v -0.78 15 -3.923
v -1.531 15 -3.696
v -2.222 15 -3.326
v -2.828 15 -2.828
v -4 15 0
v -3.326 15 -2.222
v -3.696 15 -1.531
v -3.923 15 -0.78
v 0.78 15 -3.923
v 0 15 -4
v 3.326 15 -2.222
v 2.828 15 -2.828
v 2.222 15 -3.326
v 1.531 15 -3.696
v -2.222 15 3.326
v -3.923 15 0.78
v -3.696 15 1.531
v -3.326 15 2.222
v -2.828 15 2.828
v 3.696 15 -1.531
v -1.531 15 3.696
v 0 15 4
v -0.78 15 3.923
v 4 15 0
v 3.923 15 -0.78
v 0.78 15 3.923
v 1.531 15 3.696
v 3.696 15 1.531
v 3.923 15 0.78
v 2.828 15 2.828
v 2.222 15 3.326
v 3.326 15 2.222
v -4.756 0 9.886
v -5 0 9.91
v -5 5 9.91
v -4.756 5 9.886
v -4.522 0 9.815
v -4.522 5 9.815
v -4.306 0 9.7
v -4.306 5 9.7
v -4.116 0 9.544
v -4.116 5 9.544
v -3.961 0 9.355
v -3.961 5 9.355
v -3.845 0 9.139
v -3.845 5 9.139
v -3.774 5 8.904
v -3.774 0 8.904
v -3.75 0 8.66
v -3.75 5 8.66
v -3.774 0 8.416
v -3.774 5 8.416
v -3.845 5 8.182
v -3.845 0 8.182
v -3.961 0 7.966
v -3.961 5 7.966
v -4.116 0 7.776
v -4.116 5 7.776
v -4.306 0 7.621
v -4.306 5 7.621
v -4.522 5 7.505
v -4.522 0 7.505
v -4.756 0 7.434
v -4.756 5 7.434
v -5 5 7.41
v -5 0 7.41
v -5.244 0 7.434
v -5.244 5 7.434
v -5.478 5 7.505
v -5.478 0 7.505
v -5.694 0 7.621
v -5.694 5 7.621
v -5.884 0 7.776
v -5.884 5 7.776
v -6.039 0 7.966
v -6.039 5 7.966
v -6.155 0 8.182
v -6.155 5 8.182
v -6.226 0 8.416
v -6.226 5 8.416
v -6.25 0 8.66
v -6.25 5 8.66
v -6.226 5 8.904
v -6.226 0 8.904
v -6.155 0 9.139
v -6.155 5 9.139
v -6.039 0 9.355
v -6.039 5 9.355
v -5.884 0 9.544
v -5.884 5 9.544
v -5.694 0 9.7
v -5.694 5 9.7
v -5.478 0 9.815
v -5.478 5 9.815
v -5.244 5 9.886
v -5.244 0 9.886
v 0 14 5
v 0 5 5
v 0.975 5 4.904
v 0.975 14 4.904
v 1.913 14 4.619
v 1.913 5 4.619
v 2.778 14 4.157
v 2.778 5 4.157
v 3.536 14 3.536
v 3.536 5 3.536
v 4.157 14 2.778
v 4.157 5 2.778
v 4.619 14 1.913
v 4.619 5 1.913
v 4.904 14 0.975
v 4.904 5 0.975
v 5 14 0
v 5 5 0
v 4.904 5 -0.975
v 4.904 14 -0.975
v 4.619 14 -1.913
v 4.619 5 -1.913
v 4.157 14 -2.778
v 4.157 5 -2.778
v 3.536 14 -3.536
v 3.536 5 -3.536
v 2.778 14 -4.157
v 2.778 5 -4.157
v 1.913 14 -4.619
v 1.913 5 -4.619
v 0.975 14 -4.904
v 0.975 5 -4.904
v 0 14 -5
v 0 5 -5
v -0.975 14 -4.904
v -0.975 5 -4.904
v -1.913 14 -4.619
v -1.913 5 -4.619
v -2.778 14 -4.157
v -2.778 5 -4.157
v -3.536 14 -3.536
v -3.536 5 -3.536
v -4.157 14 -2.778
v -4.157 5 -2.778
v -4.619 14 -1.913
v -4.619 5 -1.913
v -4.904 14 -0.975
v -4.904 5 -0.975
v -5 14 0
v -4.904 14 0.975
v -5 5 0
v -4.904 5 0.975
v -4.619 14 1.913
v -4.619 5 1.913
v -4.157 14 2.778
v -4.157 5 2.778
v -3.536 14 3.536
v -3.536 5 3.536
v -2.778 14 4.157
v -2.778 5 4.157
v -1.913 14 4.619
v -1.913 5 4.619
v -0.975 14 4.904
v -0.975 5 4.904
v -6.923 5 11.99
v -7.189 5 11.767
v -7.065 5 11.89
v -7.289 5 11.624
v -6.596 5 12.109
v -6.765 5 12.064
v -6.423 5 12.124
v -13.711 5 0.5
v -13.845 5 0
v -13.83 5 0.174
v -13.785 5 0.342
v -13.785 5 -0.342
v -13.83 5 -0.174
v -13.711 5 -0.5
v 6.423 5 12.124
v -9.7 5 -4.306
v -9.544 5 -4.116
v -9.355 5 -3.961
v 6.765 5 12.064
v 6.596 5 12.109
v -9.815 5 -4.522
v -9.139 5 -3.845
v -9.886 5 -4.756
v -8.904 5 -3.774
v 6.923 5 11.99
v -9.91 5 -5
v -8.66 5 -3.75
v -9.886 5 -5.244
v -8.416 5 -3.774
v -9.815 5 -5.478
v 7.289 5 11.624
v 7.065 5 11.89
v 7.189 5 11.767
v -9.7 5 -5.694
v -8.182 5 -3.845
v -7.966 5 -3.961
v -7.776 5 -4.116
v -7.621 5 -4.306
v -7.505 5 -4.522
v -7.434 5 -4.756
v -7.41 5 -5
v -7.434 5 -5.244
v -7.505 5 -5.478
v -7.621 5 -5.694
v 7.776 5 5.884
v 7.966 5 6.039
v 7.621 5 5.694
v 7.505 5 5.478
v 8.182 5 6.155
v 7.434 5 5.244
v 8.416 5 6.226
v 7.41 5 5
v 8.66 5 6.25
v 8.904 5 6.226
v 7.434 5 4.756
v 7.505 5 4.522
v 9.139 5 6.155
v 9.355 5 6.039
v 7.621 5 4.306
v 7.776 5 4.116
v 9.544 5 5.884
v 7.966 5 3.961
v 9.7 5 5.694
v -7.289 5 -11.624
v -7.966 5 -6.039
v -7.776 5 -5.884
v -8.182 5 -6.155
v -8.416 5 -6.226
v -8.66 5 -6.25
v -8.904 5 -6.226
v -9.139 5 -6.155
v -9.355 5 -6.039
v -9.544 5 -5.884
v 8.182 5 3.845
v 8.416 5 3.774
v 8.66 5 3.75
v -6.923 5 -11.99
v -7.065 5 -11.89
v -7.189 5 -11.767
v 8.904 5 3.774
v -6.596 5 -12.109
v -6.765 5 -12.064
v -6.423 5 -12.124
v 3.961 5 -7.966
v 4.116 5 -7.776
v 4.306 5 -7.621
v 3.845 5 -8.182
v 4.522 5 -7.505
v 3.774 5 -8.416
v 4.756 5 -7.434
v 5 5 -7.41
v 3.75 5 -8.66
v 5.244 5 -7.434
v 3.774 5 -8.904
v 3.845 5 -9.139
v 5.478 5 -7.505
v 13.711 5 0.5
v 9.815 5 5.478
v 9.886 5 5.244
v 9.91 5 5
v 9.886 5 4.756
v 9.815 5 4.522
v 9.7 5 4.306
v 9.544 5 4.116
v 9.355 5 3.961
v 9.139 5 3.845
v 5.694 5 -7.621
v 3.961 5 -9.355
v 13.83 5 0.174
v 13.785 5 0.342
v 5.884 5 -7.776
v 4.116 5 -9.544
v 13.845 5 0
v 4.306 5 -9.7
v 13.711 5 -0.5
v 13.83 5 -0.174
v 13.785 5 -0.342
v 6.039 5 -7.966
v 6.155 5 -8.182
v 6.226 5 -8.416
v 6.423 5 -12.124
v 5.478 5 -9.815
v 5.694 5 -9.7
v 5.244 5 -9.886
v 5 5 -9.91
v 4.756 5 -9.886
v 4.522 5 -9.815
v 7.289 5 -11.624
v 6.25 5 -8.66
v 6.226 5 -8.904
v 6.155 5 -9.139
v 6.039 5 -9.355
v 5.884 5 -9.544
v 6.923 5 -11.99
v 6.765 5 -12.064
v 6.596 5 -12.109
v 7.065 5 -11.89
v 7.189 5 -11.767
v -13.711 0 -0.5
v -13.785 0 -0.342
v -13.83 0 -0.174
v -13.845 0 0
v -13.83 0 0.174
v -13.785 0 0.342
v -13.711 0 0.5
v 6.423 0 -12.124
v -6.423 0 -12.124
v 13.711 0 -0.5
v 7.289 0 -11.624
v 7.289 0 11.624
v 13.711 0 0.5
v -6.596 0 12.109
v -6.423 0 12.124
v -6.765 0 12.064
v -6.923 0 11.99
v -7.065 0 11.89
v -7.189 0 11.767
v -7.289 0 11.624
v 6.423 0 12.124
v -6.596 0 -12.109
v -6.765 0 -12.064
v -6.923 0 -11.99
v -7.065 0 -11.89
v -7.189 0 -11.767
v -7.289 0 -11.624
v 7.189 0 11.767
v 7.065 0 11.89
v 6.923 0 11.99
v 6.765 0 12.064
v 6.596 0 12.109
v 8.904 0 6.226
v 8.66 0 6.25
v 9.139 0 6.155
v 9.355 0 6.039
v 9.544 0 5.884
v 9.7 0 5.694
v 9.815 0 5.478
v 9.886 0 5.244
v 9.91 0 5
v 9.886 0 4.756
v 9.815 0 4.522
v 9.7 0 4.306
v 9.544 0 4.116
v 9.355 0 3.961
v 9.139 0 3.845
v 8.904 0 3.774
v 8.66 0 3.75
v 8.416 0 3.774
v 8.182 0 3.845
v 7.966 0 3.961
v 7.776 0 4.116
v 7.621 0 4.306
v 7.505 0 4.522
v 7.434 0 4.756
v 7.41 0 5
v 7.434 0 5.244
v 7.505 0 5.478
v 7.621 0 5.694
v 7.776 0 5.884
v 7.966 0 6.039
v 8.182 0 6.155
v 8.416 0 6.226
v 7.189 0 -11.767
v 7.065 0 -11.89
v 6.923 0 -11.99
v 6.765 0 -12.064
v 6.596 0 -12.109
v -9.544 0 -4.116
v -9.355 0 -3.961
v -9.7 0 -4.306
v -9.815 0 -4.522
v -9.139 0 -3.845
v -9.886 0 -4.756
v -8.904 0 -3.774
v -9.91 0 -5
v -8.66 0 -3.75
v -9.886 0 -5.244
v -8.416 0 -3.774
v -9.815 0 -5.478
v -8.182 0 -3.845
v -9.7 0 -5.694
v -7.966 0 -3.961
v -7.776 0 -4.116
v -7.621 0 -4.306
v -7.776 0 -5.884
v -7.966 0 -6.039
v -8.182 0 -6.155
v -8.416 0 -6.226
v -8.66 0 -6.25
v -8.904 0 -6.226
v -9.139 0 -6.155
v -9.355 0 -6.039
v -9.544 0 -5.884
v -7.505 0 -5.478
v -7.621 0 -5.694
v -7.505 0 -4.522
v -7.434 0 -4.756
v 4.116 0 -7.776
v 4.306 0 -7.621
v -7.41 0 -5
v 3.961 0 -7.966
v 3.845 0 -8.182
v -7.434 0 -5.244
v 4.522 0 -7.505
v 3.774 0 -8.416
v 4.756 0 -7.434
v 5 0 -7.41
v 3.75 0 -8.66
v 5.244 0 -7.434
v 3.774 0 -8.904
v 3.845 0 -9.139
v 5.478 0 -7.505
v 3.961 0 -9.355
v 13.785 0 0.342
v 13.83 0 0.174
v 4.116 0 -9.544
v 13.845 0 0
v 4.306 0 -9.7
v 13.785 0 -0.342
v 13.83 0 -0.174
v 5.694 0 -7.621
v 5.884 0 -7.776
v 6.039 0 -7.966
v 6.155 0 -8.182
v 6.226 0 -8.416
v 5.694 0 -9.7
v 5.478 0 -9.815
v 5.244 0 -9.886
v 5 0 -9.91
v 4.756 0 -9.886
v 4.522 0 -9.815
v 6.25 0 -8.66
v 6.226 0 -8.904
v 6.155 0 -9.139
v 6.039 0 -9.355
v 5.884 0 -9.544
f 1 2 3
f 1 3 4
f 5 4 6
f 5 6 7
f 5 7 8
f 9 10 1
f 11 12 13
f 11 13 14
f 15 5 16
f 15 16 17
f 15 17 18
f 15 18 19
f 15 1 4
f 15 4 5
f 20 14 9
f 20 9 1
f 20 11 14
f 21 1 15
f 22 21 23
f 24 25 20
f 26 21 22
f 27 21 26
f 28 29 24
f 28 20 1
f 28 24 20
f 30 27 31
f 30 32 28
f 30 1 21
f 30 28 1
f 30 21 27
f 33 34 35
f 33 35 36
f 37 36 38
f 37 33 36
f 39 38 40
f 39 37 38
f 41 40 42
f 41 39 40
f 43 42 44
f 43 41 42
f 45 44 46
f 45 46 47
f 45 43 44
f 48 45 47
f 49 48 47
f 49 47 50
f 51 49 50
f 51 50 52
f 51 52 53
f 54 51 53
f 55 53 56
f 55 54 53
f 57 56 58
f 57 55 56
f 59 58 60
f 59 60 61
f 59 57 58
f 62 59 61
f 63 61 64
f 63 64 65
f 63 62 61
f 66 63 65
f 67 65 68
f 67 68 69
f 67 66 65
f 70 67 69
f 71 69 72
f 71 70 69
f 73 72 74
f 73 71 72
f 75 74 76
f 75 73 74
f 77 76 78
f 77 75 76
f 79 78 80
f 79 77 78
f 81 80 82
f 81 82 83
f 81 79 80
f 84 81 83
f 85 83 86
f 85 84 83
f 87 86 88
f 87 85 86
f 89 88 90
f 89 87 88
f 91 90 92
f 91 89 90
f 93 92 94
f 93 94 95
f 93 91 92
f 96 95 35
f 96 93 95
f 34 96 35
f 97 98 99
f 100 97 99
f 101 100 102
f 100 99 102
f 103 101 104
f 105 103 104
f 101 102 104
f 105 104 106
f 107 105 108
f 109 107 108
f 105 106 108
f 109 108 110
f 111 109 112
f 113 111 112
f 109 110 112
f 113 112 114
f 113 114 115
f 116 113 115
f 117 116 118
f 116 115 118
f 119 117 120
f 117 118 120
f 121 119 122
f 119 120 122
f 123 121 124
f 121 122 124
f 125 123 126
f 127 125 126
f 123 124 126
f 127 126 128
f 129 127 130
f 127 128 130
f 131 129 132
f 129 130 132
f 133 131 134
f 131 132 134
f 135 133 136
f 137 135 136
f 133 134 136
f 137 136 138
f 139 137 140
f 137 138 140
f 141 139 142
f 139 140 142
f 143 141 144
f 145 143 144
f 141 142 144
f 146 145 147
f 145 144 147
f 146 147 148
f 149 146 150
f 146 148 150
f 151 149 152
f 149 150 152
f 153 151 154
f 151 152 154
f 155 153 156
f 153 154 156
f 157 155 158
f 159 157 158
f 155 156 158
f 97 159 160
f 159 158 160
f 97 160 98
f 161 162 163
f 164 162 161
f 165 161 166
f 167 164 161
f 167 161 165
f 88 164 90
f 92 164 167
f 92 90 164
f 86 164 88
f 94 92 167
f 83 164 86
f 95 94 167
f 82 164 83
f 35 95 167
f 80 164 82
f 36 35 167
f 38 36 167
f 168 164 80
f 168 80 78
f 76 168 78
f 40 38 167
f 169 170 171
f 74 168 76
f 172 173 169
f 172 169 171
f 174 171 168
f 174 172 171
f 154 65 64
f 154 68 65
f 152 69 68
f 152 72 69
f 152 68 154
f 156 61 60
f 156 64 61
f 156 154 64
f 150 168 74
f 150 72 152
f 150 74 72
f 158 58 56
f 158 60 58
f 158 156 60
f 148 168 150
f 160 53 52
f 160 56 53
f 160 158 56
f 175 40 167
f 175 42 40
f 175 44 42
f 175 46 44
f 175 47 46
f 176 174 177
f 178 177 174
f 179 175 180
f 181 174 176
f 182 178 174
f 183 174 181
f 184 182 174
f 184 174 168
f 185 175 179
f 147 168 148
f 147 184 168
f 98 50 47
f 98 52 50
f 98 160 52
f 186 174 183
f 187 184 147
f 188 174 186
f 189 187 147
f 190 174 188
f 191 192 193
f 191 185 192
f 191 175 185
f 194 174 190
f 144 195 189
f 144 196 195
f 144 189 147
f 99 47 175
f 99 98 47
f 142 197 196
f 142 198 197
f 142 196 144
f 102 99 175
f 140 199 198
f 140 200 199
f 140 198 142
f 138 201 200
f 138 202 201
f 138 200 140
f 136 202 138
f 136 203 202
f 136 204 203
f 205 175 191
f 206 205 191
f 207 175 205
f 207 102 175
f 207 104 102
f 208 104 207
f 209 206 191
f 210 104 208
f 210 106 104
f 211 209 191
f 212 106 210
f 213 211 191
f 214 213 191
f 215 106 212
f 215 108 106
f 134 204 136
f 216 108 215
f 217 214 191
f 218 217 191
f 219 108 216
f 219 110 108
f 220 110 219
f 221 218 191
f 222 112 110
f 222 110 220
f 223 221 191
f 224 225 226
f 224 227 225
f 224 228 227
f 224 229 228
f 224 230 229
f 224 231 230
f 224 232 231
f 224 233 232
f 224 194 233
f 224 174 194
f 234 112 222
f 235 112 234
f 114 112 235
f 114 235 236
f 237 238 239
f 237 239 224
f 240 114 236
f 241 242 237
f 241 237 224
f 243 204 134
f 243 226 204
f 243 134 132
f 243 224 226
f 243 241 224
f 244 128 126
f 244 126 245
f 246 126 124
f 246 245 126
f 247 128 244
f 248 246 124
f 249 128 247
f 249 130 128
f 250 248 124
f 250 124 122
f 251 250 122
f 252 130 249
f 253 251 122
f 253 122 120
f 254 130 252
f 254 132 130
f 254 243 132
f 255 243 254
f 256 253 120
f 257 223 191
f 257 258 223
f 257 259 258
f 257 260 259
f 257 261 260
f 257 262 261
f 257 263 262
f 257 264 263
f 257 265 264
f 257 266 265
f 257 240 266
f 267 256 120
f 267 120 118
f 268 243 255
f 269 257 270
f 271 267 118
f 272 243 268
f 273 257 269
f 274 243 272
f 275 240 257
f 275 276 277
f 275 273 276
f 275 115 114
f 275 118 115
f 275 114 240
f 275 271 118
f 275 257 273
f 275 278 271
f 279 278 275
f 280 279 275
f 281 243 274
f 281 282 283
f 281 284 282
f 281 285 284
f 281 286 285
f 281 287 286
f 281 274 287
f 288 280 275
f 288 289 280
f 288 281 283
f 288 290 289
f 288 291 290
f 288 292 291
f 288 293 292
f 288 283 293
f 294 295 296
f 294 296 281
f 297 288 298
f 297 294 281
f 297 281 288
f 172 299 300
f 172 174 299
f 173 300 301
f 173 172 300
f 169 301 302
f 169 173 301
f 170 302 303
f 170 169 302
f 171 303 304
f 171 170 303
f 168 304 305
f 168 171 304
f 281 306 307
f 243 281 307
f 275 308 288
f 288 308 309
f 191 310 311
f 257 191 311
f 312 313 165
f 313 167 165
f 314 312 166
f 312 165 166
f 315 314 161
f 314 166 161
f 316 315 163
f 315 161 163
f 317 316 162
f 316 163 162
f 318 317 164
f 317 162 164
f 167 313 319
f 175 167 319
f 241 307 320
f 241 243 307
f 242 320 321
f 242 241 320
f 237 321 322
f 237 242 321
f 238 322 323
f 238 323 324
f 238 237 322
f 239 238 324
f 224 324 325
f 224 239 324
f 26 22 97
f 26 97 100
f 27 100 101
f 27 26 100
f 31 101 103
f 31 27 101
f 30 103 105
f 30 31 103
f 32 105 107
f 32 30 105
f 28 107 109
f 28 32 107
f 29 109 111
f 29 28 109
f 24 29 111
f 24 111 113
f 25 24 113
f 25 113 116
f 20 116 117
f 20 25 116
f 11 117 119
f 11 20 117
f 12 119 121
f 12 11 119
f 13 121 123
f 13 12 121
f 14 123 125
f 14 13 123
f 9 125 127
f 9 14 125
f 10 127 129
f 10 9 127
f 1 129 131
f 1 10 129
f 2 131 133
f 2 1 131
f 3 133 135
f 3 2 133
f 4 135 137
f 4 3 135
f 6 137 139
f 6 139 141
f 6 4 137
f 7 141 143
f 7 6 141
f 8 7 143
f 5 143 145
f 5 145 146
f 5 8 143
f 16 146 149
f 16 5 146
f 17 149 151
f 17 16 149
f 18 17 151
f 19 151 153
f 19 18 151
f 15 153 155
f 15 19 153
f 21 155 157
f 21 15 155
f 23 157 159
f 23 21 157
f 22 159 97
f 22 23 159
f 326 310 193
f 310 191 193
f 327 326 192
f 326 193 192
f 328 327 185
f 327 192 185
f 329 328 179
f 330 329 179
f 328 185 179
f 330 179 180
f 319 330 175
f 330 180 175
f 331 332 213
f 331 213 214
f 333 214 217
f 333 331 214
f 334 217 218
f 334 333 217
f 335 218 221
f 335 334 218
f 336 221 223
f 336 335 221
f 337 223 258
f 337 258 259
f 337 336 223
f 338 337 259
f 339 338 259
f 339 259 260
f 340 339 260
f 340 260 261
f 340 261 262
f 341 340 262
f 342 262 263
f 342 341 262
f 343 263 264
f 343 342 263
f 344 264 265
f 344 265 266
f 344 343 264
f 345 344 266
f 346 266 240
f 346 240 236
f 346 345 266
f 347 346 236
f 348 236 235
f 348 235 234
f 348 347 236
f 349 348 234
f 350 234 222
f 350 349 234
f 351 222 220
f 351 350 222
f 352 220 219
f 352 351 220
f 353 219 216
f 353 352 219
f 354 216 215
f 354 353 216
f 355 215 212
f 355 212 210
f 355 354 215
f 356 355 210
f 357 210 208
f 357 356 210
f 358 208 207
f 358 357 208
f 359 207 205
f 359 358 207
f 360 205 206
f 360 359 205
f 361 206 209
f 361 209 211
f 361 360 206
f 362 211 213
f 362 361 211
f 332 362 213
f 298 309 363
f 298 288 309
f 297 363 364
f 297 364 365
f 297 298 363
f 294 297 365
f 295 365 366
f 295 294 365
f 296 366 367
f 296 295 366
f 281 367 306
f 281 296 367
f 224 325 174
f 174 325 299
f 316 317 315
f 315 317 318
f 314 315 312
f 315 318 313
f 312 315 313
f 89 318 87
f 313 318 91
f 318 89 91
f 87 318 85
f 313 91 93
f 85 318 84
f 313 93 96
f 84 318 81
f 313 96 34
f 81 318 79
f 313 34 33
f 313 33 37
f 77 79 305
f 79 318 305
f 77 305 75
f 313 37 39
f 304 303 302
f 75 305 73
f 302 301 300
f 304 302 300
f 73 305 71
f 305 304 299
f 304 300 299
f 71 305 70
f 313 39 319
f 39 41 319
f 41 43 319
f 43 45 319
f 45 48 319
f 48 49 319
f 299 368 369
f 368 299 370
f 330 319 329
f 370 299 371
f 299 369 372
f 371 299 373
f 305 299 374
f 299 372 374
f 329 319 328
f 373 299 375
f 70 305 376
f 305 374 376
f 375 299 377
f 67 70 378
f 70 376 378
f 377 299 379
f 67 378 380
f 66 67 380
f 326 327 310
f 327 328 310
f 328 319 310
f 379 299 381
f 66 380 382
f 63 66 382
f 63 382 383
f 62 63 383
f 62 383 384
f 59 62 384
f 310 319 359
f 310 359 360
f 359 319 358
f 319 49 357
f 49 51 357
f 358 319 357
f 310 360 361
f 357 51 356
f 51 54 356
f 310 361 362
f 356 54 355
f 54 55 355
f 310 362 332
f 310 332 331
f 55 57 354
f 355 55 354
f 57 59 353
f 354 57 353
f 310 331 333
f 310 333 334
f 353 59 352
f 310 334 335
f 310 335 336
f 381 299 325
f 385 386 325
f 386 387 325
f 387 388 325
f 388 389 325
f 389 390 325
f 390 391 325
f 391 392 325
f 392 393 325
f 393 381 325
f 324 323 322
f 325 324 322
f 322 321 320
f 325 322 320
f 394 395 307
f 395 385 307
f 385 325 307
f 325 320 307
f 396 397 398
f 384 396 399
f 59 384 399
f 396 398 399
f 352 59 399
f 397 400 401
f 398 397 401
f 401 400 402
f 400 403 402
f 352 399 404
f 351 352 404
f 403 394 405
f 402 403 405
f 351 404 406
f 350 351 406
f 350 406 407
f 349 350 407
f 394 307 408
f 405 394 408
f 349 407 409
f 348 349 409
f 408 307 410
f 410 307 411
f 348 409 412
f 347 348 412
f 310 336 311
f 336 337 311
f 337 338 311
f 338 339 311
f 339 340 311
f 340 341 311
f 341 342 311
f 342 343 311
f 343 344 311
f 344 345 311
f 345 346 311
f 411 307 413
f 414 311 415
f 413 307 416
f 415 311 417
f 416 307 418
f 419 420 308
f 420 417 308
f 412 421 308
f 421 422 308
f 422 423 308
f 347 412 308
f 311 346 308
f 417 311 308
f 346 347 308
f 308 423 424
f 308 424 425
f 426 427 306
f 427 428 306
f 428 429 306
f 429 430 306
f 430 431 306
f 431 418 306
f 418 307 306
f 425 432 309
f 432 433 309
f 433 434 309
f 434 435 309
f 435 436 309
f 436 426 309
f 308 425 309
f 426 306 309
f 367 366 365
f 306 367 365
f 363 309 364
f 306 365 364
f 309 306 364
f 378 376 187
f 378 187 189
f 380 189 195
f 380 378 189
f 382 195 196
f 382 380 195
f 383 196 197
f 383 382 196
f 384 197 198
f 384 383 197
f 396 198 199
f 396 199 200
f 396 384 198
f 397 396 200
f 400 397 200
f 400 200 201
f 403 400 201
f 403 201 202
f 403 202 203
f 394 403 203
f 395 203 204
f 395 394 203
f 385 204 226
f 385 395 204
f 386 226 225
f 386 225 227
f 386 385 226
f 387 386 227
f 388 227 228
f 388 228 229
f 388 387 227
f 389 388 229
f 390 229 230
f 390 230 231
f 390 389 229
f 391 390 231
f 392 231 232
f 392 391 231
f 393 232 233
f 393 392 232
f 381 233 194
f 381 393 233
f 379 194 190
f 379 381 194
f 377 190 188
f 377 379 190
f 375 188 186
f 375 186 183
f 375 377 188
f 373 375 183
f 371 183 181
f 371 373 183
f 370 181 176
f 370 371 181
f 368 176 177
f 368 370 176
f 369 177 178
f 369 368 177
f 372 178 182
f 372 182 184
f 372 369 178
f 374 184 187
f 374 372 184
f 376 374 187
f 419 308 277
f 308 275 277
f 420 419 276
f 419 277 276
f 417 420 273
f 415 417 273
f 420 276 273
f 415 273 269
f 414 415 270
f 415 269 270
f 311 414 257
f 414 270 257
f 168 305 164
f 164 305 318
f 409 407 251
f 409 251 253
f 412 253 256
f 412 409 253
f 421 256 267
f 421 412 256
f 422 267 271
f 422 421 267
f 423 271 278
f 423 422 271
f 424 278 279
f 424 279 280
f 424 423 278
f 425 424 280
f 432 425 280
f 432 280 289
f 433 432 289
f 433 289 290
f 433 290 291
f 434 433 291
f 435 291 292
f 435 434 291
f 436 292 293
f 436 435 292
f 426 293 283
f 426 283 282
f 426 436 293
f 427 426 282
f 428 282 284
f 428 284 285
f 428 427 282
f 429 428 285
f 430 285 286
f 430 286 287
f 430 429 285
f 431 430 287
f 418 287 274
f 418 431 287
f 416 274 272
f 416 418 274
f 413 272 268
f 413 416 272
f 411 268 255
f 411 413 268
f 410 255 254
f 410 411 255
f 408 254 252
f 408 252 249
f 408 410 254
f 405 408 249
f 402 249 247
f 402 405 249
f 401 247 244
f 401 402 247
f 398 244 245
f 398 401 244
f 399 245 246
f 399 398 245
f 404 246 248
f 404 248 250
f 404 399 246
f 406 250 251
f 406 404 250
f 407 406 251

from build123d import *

# Parameters (mm, degrees)
SKETCH_1_R      = 1.25
EXTRUDE_1_DEPTH = 5
SKETCH_2_R      = 5
EXTRUDE_2_DEPTH = 10
FILLET_1_R      = 1
CHAMFER_1_SIZE  = 1


with BuildPart() as part:
    # Эскиз1 → Бобышка-Вытянуть1 (new body)
    with BuildSketch(Plane(origin=(0, 0, 0), x_dir=(1, 0, 0), z_dir=(0, 1, 0))):
        Polygon((14, 0), (7, 12.124355653), (-7, 12.124355653), (-14, 0), (-7, -12.124355653), (7, -12.124355653), align=None)
        with Locations(Location((5, 8.660254038, 0), (0, 0, 270))):
            Circle(SKETCH_1_R, mode=Mode.SUBTRACT)
        with Locations(Location((8.660254038, -5, 0), (0, 0, 270))):
            Circle(SKETCH_1_R, mode=Mode.SUBTRACT)
        with Locations(Location((-5, -8.660254038, 0), (0, 0, 270))):
            Circle(SKETCH_1_R, mode=Mode.SUBTRACT)
        with Locations(Location((-8.660254038, 5, 0), (0, 0, 270))):
            Circle(SKETCH_1_R, mode=Mode.SUBTRACT)
    extrude(amount=EXTRUDE_1_DEPTH)

    # Эскиз2 → Бобышка-Вытянуть2 (add)
    with BuildSketch(Plane(origin=(0, 5, 0), x_dir=(1, 0, 0), z_dir=(0, 1, 0))):
        with Locations(Location((0, 0, 0), (0, 0, 270))):
            Circle(SKETCH_2_R)
    extrude(amount=EXTRUDE_2_DEPTH)

    # Скругление1
    fillet_1_edges = [part.edges().sort_by_distance(p)[0] for p in [
        (7, 2.5, 12.124355653),
        (-7, 2.5, 12.124355653),
        (-14, 2.5, 0),
        (-7, 2.5, -12.124355653),
        (7, 2.5, -12.124355653),
        (14, 2.5, 0),
    ]]
    fillet(fillet_1_edges, radius=FILLET_1_R)

    # Фаска1
    chamfer_1_edges = [part.edges().sort_by_distance(p)[0] for p in [
        (0, 15, -5),
    ]]
    chamfer(chamfer_1_edges, length=CHAMFER_1_SIZE)


solid = part.part
